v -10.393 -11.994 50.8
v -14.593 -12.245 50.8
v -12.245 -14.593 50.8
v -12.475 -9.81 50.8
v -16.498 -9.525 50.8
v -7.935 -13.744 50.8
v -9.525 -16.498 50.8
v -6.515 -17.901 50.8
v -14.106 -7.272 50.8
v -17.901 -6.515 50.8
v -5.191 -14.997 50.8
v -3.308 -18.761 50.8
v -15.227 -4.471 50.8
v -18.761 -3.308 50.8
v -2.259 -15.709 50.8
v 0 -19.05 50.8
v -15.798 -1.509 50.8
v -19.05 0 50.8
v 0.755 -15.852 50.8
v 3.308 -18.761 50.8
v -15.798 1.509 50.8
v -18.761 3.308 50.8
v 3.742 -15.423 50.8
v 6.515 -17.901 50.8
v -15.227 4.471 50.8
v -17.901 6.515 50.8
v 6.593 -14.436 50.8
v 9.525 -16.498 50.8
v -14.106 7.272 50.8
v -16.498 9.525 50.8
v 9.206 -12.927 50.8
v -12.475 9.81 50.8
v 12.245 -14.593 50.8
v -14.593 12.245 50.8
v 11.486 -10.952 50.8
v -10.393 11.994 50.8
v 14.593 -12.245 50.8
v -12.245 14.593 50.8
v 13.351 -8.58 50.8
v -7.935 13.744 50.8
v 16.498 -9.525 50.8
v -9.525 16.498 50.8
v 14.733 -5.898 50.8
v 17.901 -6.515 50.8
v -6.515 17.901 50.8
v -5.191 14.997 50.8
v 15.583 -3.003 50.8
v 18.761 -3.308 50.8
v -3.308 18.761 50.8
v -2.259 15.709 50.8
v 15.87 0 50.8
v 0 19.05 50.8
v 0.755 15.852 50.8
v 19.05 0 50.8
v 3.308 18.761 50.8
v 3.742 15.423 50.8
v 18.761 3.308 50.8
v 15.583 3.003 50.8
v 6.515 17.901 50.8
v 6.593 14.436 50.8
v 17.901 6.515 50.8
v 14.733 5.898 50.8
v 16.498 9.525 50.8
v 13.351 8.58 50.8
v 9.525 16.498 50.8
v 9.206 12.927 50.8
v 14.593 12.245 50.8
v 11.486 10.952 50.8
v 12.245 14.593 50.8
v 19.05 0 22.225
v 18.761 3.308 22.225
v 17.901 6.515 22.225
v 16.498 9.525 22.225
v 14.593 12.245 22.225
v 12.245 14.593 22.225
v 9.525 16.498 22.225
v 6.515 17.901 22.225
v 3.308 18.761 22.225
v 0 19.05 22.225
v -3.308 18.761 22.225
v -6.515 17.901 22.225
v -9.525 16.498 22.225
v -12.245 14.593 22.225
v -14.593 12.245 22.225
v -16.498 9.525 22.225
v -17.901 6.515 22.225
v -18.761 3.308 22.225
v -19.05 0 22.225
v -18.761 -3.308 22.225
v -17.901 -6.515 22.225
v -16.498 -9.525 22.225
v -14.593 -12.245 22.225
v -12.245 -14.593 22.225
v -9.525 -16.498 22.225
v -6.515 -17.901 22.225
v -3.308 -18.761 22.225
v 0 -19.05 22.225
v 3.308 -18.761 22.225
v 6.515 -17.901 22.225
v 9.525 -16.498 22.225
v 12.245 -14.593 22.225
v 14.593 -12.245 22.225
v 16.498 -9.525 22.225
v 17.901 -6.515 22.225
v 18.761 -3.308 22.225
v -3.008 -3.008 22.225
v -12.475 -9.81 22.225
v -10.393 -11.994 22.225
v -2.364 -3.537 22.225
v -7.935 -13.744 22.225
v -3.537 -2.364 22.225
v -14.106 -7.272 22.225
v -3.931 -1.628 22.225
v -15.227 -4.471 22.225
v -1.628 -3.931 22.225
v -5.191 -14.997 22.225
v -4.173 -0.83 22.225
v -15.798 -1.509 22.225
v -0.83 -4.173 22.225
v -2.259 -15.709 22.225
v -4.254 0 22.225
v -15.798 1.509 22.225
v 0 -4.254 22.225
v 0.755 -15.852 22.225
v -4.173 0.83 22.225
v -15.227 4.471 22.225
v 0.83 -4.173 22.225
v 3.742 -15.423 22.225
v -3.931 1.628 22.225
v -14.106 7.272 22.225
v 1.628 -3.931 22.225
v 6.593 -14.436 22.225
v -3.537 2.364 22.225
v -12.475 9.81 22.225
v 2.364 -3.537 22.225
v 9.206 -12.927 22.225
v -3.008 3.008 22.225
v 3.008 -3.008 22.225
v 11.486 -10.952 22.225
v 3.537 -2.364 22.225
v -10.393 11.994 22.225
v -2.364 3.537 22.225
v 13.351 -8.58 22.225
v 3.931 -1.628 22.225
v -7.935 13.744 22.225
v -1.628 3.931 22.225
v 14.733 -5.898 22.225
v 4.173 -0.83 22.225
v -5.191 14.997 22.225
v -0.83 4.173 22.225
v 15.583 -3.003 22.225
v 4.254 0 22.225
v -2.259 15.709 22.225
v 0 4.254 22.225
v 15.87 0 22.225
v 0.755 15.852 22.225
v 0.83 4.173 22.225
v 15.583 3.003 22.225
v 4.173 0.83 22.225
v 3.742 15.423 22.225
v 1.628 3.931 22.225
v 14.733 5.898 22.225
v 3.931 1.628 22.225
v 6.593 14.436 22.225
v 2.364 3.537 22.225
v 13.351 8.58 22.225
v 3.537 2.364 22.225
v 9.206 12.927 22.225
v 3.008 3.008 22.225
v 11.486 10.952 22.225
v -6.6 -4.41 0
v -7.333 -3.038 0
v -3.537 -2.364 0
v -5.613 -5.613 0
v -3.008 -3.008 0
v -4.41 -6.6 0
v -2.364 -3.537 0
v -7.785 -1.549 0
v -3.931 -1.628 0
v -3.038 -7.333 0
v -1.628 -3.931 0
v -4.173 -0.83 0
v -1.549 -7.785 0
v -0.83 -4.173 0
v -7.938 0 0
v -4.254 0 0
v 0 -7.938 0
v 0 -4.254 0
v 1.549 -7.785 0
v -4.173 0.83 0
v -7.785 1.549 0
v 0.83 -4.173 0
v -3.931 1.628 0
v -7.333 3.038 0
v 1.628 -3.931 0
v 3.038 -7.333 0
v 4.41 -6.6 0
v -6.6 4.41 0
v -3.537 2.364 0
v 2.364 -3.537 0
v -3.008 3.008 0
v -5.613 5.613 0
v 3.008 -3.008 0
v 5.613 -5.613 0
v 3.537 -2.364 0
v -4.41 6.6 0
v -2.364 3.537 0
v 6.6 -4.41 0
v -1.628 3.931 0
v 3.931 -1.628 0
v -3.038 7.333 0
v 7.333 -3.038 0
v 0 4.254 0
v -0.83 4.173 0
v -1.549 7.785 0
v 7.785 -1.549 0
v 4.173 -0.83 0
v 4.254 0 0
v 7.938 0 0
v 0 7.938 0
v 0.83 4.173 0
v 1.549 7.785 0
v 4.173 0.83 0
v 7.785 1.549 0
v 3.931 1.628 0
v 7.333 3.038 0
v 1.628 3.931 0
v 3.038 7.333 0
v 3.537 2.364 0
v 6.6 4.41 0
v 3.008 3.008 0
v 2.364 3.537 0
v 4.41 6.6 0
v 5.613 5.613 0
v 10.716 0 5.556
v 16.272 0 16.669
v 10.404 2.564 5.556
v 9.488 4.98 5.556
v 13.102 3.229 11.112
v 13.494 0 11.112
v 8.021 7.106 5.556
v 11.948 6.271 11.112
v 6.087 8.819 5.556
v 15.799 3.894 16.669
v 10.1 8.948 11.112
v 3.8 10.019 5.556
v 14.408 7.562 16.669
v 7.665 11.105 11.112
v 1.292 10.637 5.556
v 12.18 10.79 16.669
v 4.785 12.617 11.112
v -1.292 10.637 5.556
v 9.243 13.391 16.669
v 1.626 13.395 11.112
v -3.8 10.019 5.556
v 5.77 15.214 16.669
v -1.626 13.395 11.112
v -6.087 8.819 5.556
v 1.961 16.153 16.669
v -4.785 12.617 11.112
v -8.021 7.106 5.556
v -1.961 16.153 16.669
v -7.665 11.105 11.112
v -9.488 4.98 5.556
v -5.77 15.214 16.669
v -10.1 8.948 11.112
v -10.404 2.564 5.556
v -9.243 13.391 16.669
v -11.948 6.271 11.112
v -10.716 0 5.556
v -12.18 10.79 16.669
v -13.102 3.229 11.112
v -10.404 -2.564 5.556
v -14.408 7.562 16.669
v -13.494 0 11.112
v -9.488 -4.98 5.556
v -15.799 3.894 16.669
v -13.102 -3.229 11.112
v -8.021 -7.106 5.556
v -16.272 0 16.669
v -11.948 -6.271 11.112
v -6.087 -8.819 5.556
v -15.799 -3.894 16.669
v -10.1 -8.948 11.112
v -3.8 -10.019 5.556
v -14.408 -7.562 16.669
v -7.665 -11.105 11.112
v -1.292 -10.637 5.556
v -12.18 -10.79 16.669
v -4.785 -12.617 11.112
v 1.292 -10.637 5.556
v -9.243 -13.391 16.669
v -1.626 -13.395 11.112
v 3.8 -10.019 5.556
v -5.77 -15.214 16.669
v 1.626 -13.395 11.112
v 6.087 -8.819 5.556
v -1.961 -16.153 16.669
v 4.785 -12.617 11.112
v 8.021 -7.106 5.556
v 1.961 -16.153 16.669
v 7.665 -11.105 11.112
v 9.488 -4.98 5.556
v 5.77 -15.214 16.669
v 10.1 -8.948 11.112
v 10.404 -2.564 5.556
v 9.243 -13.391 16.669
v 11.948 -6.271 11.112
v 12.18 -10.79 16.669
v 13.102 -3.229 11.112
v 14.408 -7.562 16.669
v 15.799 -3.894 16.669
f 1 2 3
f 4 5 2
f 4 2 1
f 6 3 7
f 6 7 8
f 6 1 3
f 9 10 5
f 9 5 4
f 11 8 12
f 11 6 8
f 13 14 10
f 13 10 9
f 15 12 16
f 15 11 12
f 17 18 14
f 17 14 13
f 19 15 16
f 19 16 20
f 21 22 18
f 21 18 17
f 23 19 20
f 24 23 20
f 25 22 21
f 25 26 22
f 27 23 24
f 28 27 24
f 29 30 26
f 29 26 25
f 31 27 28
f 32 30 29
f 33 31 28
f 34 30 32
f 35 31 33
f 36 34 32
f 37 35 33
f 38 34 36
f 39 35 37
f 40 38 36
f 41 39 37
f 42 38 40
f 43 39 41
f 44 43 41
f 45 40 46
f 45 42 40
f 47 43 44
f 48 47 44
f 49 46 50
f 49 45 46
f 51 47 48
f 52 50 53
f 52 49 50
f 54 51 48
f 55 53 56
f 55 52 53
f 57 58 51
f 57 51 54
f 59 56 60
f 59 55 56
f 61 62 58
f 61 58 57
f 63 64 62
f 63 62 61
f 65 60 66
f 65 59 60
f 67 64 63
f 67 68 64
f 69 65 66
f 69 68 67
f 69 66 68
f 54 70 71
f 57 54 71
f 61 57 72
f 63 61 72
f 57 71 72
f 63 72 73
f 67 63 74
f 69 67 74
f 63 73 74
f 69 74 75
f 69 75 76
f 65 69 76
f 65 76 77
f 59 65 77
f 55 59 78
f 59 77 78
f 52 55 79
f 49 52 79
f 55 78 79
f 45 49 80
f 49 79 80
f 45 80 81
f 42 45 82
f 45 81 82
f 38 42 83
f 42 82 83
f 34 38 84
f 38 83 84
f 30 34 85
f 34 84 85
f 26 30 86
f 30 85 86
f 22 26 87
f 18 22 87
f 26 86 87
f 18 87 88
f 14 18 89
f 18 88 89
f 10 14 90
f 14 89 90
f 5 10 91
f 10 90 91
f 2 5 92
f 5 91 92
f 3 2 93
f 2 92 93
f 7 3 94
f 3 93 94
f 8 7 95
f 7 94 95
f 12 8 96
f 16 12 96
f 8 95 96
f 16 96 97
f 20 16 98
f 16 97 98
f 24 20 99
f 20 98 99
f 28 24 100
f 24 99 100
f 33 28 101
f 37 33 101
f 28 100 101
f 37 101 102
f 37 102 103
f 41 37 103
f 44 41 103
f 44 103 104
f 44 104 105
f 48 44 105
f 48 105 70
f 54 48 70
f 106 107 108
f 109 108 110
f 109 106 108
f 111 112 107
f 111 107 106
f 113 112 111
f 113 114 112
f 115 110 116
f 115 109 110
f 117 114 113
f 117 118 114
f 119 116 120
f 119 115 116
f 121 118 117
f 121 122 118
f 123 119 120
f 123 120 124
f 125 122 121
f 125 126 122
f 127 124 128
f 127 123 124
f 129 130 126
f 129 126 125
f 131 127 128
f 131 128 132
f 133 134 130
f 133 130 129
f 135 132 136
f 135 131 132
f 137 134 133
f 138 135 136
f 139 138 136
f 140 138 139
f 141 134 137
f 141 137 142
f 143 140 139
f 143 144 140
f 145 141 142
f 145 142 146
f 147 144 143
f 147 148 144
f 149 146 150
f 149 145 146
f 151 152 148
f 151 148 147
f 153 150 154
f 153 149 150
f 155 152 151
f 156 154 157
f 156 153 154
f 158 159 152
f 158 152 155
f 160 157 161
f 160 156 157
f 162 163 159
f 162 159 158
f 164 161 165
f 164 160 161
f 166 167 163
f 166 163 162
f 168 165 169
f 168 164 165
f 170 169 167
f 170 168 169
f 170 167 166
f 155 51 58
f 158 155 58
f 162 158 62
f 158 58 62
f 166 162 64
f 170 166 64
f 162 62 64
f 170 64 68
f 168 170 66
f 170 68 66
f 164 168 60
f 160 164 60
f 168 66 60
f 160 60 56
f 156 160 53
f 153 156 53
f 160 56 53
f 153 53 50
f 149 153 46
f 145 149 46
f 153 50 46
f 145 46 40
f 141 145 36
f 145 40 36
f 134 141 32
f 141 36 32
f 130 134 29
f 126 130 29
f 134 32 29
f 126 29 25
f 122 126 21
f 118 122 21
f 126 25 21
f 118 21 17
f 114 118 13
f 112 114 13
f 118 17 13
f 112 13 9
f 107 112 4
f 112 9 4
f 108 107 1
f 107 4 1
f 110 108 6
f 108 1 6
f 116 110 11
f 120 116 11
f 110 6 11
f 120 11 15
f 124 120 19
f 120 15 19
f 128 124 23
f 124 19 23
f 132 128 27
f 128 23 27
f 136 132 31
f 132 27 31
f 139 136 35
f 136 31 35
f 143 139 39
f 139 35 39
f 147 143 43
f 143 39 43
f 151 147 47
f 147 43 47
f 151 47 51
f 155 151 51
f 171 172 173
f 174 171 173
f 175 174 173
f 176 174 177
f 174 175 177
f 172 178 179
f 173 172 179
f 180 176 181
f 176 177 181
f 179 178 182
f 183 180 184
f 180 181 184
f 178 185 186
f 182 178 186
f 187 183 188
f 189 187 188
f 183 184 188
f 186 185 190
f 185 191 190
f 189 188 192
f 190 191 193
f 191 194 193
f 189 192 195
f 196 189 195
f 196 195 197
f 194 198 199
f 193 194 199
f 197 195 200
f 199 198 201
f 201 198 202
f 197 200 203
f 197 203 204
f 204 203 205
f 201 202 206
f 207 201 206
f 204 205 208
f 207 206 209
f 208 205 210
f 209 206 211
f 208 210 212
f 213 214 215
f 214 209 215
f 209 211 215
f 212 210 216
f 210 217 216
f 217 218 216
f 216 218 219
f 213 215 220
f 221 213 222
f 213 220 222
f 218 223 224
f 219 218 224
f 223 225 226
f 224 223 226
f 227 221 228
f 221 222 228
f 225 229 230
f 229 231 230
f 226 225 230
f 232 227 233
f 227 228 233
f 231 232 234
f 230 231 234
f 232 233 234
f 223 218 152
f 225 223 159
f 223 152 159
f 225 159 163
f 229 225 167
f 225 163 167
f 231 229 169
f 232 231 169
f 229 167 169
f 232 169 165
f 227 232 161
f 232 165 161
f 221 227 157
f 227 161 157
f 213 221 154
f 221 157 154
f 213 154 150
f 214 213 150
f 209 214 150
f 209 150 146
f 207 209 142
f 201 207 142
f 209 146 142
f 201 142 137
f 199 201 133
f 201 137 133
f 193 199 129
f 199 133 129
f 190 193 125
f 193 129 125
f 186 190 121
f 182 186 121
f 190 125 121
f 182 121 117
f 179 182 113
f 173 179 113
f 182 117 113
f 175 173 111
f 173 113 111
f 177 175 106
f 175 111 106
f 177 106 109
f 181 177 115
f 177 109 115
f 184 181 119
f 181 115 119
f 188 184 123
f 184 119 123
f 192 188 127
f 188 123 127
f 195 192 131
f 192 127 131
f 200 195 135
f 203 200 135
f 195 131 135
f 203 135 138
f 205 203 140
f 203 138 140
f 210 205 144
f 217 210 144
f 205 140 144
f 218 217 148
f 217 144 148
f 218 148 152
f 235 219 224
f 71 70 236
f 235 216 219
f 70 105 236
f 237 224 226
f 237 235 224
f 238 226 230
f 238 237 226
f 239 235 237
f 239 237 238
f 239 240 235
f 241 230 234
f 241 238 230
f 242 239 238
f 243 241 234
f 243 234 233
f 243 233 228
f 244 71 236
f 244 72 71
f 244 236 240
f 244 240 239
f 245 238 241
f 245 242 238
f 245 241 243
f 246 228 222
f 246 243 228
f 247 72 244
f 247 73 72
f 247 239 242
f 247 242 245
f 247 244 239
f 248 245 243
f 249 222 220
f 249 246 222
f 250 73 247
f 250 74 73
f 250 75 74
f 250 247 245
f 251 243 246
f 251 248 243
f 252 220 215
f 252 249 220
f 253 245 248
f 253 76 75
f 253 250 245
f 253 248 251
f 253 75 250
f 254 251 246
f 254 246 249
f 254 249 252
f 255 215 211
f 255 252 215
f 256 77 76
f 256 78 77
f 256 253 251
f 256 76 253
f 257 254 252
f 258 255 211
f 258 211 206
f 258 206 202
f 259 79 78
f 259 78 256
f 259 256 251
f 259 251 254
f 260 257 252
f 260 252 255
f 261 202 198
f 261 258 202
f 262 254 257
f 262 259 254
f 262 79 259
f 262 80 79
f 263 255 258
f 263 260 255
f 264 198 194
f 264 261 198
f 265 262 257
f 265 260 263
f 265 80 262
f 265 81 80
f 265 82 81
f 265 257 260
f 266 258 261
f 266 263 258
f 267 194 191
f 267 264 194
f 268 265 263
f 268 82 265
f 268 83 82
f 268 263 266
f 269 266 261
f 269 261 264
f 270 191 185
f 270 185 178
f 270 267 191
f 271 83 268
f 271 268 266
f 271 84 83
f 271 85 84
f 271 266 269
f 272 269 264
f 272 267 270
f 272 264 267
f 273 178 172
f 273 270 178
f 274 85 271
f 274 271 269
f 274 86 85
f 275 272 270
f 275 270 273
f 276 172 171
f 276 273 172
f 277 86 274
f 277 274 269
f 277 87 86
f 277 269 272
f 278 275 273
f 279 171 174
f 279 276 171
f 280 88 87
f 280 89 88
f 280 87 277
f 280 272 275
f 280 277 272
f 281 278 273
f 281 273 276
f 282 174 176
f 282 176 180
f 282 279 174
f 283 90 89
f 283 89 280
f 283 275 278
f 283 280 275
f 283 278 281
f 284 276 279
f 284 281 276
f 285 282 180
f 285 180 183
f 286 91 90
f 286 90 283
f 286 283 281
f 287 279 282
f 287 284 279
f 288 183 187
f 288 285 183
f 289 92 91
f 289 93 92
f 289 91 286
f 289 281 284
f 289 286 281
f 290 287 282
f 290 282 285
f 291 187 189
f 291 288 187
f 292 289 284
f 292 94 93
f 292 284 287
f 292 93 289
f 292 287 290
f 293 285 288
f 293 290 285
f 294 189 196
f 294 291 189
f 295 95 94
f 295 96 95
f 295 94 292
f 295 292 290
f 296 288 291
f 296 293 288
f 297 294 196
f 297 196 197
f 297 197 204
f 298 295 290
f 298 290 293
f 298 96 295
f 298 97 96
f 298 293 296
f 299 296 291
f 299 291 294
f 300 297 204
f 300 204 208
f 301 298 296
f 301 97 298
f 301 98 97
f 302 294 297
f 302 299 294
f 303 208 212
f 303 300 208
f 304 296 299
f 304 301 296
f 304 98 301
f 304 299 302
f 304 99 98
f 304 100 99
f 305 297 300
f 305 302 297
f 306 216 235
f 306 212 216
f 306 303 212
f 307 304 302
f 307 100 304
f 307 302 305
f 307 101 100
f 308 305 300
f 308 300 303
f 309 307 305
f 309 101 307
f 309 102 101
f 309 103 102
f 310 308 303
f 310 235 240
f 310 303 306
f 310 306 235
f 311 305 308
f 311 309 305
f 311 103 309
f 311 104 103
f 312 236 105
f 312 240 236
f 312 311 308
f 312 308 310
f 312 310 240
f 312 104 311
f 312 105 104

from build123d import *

# Parameters (mm, degrees)
F2_R     = 7.9375
F1_R     = 19.05
F4_R     = 4.2545
F5_DEPTH = 22.225
F6_DEPTH = 28.575
F7_R     = 15.870198
F8_DEPTH = 28.575


with BuildPart() as f3:
    # F2 (on Top) → F3 section 0
    with BuildSketch(Plane.XY):
        Circle(F2_R)
    # F1 (on offset) → F3 section 1
    with BuildSketch(Plane.XY.offset(22.225)):
        Circle(F1_R)
    loft()

    # F4 (on offset) → F5 (cut)
    with BuildSketch(Plane.XY.offset(22.225)):
        Circle(F4_R)
    extrude(amount=-F5_DEPTH, mode=Mode.SUBTRACT)

    # F1 (on offset) → F6 (join)
    with BuildSketch(Plane.XY.offset(22.225)):
        Circle(F1_R)
    extrude(amount=F6_DEPTH)

    # F7 (on face) → F8 (cut)
    with BuildSketch(Plane.XY.offset(50.8)):
        Circle(F7_R)
    extrude(amount=-F8_DEPTH, mode=Mode.SUBTRACT)


solid = f3.part
